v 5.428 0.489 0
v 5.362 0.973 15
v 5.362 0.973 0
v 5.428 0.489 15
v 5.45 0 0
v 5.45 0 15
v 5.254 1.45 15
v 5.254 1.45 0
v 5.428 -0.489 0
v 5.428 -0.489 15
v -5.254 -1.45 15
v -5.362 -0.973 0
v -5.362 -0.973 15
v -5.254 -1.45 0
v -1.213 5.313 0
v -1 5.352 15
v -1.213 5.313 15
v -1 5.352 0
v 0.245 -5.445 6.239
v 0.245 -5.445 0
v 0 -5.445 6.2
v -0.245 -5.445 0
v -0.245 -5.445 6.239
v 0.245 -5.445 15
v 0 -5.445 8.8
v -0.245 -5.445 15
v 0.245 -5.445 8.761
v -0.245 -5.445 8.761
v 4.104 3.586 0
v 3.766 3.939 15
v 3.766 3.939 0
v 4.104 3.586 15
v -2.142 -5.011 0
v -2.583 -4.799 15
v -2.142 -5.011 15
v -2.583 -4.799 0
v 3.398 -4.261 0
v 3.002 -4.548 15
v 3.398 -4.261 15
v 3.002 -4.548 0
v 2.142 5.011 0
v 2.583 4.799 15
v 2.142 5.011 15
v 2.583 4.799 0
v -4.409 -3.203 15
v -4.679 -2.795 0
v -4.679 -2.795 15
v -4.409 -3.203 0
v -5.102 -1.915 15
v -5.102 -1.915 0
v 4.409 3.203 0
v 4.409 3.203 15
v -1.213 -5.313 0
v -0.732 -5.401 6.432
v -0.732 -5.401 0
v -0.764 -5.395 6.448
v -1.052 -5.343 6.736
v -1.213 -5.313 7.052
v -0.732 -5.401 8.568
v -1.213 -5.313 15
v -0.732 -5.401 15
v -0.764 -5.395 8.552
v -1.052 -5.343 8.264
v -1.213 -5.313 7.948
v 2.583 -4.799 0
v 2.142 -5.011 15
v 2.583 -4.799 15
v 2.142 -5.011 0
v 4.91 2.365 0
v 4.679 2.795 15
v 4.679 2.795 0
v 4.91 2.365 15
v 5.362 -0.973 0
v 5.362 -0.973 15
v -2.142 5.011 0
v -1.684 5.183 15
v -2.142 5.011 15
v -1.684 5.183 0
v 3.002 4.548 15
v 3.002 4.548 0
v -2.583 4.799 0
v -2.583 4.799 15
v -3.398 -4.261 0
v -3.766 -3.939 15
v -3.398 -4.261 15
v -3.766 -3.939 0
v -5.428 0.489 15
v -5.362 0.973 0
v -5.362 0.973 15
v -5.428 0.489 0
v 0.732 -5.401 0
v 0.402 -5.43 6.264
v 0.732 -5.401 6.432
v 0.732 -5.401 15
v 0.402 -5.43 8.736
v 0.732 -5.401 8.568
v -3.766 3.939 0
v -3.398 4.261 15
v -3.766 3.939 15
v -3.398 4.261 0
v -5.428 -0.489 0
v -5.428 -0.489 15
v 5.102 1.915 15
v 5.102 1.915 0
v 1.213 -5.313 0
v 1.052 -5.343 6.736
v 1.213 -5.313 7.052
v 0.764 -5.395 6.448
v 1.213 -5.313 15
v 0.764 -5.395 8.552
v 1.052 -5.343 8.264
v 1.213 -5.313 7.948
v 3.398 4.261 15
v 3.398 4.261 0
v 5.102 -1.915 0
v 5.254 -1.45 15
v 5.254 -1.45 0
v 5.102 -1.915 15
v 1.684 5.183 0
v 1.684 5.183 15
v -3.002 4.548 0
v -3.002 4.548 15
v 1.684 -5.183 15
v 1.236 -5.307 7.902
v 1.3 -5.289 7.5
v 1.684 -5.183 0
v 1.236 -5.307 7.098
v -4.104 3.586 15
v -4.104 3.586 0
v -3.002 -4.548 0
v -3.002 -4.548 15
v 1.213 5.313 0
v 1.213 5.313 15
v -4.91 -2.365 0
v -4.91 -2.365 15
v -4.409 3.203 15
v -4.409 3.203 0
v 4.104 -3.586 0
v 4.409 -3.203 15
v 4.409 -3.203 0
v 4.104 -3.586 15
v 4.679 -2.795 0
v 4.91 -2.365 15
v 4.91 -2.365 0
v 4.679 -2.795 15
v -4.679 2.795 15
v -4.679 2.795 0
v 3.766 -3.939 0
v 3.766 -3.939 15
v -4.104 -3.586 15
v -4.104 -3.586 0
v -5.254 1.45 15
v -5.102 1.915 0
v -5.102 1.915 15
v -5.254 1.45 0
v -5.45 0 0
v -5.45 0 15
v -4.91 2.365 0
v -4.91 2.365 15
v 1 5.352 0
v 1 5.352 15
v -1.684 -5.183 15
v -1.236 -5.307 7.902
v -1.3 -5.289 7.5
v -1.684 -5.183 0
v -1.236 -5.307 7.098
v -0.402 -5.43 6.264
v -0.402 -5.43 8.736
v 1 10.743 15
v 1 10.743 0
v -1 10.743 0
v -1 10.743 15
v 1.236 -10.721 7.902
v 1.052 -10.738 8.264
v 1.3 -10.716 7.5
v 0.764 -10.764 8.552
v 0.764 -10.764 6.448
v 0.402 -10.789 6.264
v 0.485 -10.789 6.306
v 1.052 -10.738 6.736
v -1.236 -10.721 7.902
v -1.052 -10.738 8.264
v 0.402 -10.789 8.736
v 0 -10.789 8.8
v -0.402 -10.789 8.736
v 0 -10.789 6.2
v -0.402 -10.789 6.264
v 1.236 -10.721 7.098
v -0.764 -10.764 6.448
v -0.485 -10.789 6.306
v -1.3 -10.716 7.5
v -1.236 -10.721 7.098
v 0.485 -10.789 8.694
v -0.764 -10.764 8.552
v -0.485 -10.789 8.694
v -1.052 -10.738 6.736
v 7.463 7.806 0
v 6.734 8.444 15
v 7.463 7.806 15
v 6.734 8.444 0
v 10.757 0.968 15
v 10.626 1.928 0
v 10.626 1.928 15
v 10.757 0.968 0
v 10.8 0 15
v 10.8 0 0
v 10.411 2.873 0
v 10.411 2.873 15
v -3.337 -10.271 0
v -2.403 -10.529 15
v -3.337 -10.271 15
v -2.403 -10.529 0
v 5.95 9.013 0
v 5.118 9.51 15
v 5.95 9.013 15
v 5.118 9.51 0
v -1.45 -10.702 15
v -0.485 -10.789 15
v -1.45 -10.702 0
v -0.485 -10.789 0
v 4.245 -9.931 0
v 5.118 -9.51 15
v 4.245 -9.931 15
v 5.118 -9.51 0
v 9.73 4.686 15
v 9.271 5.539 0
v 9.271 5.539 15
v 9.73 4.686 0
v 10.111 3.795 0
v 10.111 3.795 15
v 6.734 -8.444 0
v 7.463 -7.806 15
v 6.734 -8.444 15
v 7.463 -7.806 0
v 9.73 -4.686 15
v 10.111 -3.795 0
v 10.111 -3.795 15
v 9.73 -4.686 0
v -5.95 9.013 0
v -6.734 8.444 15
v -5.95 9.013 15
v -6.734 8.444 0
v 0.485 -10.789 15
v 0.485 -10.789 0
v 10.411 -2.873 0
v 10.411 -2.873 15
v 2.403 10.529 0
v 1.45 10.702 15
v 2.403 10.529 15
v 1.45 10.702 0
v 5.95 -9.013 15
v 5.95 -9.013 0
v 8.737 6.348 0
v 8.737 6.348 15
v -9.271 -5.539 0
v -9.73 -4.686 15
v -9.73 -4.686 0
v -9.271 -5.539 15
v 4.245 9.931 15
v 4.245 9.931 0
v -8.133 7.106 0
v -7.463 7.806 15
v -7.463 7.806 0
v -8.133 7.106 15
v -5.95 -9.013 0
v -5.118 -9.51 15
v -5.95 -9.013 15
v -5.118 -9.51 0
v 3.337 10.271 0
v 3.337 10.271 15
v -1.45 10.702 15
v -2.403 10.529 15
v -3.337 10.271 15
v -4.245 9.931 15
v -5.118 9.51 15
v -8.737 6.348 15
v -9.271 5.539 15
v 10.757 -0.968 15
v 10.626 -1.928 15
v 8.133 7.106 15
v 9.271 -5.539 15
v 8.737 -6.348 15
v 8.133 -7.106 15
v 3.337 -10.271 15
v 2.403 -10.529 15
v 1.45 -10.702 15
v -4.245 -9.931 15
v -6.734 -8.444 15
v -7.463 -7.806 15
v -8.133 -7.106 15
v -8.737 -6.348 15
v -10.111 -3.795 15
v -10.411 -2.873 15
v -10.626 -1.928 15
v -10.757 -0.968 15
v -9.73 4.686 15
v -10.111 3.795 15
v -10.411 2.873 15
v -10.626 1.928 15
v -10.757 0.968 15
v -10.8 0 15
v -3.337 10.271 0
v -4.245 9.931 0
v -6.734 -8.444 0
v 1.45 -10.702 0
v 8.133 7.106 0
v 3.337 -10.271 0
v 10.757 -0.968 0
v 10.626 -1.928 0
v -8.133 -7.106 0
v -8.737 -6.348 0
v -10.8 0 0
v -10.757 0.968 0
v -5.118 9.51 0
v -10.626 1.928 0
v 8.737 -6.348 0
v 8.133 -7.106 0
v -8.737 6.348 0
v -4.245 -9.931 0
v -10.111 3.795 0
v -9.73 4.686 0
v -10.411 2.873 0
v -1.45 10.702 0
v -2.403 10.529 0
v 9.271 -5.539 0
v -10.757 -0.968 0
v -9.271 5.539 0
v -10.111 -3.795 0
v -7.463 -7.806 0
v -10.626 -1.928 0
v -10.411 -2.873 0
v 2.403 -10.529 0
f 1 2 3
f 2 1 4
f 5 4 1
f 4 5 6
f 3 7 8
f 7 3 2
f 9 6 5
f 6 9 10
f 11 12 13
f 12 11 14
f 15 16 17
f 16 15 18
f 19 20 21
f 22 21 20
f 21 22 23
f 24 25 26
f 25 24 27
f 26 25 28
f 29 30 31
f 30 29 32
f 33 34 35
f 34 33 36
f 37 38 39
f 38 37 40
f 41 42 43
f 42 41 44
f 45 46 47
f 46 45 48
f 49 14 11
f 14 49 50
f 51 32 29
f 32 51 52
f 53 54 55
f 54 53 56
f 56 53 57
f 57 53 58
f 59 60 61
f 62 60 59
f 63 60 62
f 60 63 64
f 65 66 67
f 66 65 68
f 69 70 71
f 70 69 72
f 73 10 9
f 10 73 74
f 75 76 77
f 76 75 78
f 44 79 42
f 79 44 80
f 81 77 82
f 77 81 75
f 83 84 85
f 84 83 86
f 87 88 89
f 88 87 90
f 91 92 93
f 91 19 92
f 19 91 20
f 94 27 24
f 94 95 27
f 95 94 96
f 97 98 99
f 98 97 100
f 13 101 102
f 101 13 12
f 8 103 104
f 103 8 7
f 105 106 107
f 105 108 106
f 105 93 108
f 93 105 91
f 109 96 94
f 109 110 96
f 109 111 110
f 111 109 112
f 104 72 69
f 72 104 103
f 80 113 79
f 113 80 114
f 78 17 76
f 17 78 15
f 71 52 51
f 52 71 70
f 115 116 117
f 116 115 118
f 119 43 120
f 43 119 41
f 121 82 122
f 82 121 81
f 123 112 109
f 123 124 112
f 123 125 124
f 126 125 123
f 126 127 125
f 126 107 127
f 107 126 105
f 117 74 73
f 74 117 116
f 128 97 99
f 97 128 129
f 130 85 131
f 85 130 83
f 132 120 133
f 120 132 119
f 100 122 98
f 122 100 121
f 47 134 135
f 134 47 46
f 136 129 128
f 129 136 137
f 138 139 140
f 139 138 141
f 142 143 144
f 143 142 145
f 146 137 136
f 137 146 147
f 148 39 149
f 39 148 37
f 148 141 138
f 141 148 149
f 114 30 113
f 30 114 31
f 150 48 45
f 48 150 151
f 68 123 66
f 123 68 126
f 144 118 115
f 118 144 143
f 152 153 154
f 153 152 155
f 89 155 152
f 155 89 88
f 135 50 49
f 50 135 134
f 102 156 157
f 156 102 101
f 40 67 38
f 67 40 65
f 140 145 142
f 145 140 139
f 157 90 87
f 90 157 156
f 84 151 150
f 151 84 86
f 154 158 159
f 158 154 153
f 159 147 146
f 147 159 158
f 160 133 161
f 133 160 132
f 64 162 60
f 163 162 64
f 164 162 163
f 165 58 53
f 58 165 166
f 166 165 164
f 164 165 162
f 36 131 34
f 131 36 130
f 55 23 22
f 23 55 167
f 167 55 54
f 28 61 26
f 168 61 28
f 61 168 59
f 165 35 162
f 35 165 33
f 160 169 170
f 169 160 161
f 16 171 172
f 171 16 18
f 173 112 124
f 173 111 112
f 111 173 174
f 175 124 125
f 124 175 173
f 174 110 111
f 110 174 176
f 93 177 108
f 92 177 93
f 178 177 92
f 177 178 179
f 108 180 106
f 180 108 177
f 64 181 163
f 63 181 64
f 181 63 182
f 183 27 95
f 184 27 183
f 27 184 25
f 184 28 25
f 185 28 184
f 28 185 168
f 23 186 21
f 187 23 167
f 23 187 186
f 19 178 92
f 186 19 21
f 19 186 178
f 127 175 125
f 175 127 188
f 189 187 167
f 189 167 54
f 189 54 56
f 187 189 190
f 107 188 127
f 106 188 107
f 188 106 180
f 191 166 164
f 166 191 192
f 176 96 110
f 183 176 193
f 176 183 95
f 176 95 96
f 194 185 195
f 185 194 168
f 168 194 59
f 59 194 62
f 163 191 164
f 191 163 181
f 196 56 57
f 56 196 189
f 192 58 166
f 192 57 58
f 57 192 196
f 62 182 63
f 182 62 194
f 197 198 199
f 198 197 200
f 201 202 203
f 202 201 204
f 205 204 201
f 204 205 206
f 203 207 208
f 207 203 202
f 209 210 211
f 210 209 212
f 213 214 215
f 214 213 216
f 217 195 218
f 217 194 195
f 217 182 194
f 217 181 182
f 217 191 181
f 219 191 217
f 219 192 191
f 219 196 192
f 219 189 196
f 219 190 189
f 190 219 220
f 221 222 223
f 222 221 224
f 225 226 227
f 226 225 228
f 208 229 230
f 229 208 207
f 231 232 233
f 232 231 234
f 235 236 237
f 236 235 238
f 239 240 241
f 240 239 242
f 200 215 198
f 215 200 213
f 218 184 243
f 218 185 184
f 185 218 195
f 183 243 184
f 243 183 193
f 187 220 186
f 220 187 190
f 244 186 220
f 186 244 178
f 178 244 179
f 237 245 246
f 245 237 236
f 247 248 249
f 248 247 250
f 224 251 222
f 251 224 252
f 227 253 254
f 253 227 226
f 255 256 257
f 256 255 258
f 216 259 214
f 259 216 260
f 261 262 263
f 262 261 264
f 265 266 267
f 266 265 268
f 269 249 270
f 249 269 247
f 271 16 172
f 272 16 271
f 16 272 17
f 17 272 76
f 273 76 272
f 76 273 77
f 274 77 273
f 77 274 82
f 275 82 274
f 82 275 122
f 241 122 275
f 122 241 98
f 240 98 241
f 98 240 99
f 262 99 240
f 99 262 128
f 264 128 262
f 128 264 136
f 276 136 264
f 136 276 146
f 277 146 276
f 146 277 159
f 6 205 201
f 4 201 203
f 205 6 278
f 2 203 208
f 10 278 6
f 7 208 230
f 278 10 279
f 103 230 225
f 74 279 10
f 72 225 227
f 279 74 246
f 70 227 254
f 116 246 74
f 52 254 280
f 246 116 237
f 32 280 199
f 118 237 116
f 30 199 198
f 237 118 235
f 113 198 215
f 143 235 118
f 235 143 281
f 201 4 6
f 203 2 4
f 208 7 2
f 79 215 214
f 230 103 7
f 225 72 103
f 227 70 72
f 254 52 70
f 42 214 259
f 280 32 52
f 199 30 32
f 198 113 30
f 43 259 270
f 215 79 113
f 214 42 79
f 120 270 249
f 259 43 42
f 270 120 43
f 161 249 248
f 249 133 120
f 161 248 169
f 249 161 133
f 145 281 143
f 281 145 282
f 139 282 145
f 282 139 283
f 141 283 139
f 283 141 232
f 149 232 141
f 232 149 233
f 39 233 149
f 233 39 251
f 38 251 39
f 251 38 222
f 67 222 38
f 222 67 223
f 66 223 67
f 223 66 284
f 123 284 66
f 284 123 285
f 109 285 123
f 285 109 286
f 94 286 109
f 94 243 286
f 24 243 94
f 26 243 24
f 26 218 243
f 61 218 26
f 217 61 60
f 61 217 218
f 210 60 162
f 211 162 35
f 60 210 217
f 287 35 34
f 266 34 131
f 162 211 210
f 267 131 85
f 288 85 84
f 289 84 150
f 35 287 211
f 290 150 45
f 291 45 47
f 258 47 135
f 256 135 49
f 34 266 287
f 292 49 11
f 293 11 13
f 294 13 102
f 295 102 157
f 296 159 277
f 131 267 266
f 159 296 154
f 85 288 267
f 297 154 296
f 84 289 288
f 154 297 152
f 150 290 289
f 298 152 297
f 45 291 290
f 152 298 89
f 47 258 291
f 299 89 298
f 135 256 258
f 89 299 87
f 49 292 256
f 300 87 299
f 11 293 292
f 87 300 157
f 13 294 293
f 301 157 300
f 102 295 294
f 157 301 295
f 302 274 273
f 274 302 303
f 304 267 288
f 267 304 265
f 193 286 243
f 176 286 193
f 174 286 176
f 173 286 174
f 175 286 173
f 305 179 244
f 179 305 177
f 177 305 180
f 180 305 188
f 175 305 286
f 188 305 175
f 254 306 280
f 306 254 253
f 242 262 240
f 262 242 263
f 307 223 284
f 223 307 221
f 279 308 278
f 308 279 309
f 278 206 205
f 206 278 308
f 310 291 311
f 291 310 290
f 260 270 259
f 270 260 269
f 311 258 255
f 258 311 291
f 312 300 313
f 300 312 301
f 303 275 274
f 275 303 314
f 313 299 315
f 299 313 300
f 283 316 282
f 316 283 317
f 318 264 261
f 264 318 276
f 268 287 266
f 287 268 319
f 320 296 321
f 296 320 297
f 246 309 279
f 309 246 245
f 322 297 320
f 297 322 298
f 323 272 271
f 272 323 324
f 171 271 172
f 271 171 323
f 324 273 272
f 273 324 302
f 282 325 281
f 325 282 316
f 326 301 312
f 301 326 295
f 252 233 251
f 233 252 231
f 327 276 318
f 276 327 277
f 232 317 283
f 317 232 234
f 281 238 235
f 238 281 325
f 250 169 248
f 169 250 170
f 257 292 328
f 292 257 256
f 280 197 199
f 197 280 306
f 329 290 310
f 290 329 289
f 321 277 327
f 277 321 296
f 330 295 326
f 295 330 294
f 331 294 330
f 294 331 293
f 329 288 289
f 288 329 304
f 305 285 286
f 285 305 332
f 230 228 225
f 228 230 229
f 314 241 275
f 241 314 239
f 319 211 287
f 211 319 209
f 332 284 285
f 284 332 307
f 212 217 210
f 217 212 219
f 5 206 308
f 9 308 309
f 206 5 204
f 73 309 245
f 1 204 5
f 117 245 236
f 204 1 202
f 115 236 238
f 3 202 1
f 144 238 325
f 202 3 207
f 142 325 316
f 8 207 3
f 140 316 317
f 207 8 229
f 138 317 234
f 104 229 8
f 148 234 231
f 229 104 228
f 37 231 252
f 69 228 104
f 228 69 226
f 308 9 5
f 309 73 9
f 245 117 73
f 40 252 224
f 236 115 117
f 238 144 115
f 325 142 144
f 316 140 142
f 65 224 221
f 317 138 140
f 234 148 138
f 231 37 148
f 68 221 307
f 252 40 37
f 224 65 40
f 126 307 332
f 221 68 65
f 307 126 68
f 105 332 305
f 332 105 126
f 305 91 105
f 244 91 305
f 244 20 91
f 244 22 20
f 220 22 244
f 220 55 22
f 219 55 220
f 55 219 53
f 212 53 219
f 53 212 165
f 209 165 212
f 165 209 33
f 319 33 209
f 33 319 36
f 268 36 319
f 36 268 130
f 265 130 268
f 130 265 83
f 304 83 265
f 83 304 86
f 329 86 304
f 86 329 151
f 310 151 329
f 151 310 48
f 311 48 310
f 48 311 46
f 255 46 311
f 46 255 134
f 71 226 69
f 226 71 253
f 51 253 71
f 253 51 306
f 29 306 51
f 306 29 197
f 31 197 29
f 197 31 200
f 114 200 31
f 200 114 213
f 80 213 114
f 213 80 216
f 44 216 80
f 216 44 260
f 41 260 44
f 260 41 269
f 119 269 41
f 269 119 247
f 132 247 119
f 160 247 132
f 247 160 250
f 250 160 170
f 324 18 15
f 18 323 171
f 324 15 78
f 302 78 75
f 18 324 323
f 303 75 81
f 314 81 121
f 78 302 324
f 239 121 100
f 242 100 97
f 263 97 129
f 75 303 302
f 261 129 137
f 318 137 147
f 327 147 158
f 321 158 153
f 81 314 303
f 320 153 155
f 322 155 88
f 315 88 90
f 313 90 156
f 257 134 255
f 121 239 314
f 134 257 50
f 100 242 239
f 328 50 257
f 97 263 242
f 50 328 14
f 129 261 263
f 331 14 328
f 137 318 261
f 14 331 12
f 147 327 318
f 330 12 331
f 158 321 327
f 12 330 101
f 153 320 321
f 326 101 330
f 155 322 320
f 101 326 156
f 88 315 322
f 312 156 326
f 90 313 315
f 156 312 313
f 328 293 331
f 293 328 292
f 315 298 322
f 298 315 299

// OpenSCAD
//Diameter of the stylus
stylusDiameter=10.5;

//Tolerance (to OD and ID)
tolerance=0.2;

penAdapter();

module penAdapter(mountDiameter=22, mountHeight=15)
{

    difference () {
    
        cylinder(r=mountDiameter/2-tolerance, h= mountHeight, $fn=70);

        union () {
            stylusMount();
            space();
            m3Hole();
        }
    }
} 


module stylusMount (mountHeight=15) {

    translate([0,0,-1]) cylinder(r=stylusDiameter/2+tolerance, mountHeight+2, $fn=70);      
}

module space (mountDiameter=22, mountHeight=15, spaceSize=2) {
    
    translate([0,mountDiameter/2,mountHeight/2-1]) cube(size = [spaceSize, mountDiameter, mountHeight+10], center=true);
}

module m3Hole (mountHeight=15,mountDiameter=22) {
    
        rotate([90,0,0]) translate([0,mountHeight/2,0]) cylinder(r=2.6/2, mountDiameter/2, $fn=20);
}
